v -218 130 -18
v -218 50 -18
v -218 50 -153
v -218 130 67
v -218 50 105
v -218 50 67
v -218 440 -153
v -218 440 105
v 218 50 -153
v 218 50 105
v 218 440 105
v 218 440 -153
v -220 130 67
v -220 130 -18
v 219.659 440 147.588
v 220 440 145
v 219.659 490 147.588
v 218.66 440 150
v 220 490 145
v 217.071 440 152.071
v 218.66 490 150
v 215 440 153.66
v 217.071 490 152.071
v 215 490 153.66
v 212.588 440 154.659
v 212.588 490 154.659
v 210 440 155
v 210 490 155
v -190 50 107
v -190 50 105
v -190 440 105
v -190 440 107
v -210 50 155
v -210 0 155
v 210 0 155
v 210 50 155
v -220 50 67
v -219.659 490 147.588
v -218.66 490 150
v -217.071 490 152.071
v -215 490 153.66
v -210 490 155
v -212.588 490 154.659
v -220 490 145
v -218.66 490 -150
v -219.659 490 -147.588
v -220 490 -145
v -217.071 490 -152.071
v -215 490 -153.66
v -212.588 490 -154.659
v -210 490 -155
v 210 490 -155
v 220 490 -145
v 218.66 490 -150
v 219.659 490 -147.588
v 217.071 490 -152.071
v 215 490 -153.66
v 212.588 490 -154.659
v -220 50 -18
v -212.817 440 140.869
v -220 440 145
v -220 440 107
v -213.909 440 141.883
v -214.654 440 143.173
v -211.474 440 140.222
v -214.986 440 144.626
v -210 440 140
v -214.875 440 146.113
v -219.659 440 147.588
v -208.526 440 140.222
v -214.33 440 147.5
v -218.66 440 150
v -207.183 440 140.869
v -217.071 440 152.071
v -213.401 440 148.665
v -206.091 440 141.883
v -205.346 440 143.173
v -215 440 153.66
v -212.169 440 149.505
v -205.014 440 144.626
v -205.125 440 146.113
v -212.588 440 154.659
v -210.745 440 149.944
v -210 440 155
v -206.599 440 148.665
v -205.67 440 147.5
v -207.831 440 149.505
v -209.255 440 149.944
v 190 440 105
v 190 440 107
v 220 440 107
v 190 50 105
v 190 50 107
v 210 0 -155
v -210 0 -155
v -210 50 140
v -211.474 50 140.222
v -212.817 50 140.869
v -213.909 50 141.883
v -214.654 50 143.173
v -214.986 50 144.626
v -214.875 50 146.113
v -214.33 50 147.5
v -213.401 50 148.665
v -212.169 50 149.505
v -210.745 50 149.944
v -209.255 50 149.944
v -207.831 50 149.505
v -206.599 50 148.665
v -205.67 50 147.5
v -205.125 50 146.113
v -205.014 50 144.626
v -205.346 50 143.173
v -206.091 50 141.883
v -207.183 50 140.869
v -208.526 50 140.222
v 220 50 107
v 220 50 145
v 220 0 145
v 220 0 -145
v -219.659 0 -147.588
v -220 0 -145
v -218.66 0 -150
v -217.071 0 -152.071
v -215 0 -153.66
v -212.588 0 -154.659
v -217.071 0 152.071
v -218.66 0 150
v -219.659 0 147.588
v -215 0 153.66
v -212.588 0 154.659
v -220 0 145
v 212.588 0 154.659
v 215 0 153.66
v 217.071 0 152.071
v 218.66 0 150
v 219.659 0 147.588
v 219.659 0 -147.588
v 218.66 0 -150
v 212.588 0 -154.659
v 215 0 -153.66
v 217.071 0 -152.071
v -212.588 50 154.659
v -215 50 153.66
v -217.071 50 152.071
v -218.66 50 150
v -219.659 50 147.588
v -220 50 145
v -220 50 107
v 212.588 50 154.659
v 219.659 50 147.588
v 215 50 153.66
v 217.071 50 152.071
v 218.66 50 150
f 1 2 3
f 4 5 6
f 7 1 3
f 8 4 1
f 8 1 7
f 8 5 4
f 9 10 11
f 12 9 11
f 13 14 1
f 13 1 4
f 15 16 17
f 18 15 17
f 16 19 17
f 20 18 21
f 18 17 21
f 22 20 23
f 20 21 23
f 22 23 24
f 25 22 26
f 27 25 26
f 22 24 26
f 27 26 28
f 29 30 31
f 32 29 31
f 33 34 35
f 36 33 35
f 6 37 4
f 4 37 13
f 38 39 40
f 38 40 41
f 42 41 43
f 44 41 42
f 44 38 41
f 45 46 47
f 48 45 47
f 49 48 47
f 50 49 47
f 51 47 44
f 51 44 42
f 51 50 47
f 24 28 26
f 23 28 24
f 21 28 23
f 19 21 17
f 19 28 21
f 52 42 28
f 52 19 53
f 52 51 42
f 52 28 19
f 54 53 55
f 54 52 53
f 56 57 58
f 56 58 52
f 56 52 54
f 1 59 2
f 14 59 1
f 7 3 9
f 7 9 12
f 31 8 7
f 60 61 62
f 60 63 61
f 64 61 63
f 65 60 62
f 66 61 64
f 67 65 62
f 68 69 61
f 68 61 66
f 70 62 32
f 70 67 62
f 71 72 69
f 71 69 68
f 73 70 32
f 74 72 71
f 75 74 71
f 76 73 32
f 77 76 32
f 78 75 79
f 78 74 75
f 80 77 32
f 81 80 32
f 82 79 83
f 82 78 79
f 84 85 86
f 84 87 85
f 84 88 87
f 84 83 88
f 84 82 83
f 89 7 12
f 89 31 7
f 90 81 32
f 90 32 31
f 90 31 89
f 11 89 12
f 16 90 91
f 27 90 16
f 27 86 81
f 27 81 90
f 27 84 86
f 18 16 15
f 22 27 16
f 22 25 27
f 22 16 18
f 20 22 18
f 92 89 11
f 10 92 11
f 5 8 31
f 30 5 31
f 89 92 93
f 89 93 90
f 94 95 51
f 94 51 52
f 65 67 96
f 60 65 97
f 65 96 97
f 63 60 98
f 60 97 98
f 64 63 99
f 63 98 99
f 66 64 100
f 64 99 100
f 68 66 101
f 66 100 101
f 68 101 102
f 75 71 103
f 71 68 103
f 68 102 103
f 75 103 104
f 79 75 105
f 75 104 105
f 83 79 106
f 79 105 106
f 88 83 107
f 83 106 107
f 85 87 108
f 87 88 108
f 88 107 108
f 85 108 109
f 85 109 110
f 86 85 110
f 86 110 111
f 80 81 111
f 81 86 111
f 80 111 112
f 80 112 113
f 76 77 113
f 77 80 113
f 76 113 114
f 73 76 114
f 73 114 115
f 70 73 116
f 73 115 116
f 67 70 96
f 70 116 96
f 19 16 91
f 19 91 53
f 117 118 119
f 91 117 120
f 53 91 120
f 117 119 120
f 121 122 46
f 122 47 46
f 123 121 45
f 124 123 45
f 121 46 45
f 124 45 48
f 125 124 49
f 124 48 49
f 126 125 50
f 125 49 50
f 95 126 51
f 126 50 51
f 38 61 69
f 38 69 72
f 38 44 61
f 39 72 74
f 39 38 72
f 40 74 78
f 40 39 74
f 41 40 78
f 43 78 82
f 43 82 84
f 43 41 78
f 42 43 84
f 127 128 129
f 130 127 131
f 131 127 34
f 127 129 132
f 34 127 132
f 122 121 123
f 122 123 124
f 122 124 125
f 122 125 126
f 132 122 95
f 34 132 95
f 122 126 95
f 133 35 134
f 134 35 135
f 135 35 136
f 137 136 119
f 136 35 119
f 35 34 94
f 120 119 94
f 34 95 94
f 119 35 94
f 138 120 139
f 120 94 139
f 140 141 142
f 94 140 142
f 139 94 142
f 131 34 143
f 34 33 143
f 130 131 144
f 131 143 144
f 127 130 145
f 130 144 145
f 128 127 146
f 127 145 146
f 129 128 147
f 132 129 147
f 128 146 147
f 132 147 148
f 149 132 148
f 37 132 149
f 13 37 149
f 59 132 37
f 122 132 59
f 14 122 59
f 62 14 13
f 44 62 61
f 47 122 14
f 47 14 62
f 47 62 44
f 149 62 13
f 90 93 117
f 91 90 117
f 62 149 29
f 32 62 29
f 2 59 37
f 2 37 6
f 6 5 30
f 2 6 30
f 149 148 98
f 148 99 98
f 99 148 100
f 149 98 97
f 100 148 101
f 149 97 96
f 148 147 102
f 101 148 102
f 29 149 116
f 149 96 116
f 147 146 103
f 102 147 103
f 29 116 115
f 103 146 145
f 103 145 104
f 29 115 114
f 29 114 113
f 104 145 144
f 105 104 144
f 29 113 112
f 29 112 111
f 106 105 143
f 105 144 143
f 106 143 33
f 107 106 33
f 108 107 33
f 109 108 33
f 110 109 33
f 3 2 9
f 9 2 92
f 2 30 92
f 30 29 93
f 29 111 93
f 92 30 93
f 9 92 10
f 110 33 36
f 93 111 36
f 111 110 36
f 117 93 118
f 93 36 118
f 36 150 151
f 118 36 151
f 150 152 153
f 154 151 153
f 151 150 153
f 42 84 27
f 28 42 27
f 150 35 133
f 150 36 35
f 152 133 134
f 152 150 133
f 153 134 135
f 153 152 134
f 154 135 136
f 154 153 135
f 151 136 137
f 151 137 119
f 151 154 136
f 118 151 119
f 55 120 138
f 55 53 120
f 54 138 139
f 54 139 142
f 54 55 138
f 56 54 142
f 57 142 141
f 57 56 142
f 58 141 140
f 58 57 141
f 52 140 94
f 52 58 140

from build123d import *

# Parameters (mm, degrees)
SKETCH1_W           = 440
SKETCH1_H           = 310
BOSS_EXTRUDE1_DEPTH = 490
SHELL1_START        = -218
SHELL1_OUTLINE_W    = 390
SHELL1_OUTLINE_H    = 308
SHELL1_DEPTH        = 436
SKETCH3_W           = 440
SKETCH3_H           = 390
CUT_EXTRUDE1_DEPTH  = 50
SKETCH4_W           = 30
SKETCH4_H           = 390
BOSS_EXTRUDE2_DEPTH = 2
SKETCH5_W           = 30
SKETCH5_H           = 390
BOSS_EXTRUDE3_DEPTH = 2
SKETCH7_R           = 5
BOSS_EXTRUDE4_DEPTH = 440
FILLET1_R           = 10
FILLET2_R           = 10
CUT_EXTRUDE2_REACH  = 678.554
SKETCH8_W           = 85
SKETCH8_H           = 80


# Read off the part's stored shape, not the designer's step: Shell1
with BuildPart() as part:
    # Sketch1 → Boss-Extrude1 (new body)
    with BuildSketch(Plane(origin=(0, 0, 0), x_dir=(1, 0, 0), z_dir=(0, 1, 0))):
        Rectangle(SKETCH1_W, SKETCH1_H)
    extrude(amount=BOSS_EXTRUDE1_DEPTH)

    # Shell1 outline → Shell1 (cut)
    with BuildSketch(Plane.YZ.offset(SHELL1_START)):
        with Locations((245, 1)):
            Rectangle(SHELL1_OUTLINE_W, SHELL1_OUTLINE_H)
    extrude(amount=SHELL1_DEPTH, mode=Mode.SUBTRACT)

    # Sketch3 → Cut-Extrude1 (cut)
    with BuildSketch(Plane.XY.offset(155)):
        with Locations((0, 245)):
            Rectangle(SKETCH3_W, SKETCH3_H)
    extrude(amount=-CUT_EXTRUDE1_DEPTH, mode=Mode.SUBTRACT)

    # Sketch4 → Boss-Extrude2 (add)
    with BuildSketch(Plane.XY.offset(105)):
        with Locations((-205, 245)):
            Rectangle(SKETCH4_W, SKETCH4_H)
    extrude(amount=BOSS_EXTRUDE2_DEPTH)

    # Sketch5 → Boss-Extrude3 (add)
    with BuildSketch(Plane.XY.offset(105)):
        with Locations((205, 245)):
            Rectangle(SKETCH5_W, SKETCH5_H)
    extrude(amount=BOSS_EXTRUDE3_DEPTH)

    # Sketch7 → Boss-Extrude4 (add)
    with BuildSketch(Plane(origin=(0, 50, 0), x_dir=(1, 0, 0), z_dir=(0, 1, 0))):
        with Locations(Location((-210, -145, 0), (0, 0, 90))):
            Circle(SKETCH7_R)
    extrude(amount=BOSS_EXTRUDE4_DEPTH)

    # Fillet1
    fillet1_edges = [part.edges().sort_by_distance(p)[0] for p in [
        (-220, 25, 155),
        (220, 25, 155),
        (220, 465, 155),
        (-220, 465, 155),
    ]]
    fillet(fillet1_edges, radius=FILLET1_R)

    # Fillet2
    fillet2_edges = [part.edges().sort_by_distance(p)[0] for p in [
        (-220, 245, -155),
        (220, 245, -155),
    ]]
    fillet(fillet2_edges, radius=FILLET2_R)

    # Sketch8 → Cut-Extrude2 (cut, up to next)
    with BuildSketch(Plane.ZY.offset(220), mode=Mode.PRIVATE) as cut_extrude2_sk1:
        with Locations((24.5, 90)):
            Rectangle(SKETCH8_W, SKETCH8_H)
    cut_extrude2_tool1 = extrude(cut_extrude2_sk1.sketch, amount=-CUT_EXTRUDE2_REACH, mode=Mode.PRIVATE) & part.part
    add(cut_extrude2_tool1.solids().sort_by_distance((-220, 90, 24.5))[0], mode=Mode.SUBTRACT)


solid = part.part
